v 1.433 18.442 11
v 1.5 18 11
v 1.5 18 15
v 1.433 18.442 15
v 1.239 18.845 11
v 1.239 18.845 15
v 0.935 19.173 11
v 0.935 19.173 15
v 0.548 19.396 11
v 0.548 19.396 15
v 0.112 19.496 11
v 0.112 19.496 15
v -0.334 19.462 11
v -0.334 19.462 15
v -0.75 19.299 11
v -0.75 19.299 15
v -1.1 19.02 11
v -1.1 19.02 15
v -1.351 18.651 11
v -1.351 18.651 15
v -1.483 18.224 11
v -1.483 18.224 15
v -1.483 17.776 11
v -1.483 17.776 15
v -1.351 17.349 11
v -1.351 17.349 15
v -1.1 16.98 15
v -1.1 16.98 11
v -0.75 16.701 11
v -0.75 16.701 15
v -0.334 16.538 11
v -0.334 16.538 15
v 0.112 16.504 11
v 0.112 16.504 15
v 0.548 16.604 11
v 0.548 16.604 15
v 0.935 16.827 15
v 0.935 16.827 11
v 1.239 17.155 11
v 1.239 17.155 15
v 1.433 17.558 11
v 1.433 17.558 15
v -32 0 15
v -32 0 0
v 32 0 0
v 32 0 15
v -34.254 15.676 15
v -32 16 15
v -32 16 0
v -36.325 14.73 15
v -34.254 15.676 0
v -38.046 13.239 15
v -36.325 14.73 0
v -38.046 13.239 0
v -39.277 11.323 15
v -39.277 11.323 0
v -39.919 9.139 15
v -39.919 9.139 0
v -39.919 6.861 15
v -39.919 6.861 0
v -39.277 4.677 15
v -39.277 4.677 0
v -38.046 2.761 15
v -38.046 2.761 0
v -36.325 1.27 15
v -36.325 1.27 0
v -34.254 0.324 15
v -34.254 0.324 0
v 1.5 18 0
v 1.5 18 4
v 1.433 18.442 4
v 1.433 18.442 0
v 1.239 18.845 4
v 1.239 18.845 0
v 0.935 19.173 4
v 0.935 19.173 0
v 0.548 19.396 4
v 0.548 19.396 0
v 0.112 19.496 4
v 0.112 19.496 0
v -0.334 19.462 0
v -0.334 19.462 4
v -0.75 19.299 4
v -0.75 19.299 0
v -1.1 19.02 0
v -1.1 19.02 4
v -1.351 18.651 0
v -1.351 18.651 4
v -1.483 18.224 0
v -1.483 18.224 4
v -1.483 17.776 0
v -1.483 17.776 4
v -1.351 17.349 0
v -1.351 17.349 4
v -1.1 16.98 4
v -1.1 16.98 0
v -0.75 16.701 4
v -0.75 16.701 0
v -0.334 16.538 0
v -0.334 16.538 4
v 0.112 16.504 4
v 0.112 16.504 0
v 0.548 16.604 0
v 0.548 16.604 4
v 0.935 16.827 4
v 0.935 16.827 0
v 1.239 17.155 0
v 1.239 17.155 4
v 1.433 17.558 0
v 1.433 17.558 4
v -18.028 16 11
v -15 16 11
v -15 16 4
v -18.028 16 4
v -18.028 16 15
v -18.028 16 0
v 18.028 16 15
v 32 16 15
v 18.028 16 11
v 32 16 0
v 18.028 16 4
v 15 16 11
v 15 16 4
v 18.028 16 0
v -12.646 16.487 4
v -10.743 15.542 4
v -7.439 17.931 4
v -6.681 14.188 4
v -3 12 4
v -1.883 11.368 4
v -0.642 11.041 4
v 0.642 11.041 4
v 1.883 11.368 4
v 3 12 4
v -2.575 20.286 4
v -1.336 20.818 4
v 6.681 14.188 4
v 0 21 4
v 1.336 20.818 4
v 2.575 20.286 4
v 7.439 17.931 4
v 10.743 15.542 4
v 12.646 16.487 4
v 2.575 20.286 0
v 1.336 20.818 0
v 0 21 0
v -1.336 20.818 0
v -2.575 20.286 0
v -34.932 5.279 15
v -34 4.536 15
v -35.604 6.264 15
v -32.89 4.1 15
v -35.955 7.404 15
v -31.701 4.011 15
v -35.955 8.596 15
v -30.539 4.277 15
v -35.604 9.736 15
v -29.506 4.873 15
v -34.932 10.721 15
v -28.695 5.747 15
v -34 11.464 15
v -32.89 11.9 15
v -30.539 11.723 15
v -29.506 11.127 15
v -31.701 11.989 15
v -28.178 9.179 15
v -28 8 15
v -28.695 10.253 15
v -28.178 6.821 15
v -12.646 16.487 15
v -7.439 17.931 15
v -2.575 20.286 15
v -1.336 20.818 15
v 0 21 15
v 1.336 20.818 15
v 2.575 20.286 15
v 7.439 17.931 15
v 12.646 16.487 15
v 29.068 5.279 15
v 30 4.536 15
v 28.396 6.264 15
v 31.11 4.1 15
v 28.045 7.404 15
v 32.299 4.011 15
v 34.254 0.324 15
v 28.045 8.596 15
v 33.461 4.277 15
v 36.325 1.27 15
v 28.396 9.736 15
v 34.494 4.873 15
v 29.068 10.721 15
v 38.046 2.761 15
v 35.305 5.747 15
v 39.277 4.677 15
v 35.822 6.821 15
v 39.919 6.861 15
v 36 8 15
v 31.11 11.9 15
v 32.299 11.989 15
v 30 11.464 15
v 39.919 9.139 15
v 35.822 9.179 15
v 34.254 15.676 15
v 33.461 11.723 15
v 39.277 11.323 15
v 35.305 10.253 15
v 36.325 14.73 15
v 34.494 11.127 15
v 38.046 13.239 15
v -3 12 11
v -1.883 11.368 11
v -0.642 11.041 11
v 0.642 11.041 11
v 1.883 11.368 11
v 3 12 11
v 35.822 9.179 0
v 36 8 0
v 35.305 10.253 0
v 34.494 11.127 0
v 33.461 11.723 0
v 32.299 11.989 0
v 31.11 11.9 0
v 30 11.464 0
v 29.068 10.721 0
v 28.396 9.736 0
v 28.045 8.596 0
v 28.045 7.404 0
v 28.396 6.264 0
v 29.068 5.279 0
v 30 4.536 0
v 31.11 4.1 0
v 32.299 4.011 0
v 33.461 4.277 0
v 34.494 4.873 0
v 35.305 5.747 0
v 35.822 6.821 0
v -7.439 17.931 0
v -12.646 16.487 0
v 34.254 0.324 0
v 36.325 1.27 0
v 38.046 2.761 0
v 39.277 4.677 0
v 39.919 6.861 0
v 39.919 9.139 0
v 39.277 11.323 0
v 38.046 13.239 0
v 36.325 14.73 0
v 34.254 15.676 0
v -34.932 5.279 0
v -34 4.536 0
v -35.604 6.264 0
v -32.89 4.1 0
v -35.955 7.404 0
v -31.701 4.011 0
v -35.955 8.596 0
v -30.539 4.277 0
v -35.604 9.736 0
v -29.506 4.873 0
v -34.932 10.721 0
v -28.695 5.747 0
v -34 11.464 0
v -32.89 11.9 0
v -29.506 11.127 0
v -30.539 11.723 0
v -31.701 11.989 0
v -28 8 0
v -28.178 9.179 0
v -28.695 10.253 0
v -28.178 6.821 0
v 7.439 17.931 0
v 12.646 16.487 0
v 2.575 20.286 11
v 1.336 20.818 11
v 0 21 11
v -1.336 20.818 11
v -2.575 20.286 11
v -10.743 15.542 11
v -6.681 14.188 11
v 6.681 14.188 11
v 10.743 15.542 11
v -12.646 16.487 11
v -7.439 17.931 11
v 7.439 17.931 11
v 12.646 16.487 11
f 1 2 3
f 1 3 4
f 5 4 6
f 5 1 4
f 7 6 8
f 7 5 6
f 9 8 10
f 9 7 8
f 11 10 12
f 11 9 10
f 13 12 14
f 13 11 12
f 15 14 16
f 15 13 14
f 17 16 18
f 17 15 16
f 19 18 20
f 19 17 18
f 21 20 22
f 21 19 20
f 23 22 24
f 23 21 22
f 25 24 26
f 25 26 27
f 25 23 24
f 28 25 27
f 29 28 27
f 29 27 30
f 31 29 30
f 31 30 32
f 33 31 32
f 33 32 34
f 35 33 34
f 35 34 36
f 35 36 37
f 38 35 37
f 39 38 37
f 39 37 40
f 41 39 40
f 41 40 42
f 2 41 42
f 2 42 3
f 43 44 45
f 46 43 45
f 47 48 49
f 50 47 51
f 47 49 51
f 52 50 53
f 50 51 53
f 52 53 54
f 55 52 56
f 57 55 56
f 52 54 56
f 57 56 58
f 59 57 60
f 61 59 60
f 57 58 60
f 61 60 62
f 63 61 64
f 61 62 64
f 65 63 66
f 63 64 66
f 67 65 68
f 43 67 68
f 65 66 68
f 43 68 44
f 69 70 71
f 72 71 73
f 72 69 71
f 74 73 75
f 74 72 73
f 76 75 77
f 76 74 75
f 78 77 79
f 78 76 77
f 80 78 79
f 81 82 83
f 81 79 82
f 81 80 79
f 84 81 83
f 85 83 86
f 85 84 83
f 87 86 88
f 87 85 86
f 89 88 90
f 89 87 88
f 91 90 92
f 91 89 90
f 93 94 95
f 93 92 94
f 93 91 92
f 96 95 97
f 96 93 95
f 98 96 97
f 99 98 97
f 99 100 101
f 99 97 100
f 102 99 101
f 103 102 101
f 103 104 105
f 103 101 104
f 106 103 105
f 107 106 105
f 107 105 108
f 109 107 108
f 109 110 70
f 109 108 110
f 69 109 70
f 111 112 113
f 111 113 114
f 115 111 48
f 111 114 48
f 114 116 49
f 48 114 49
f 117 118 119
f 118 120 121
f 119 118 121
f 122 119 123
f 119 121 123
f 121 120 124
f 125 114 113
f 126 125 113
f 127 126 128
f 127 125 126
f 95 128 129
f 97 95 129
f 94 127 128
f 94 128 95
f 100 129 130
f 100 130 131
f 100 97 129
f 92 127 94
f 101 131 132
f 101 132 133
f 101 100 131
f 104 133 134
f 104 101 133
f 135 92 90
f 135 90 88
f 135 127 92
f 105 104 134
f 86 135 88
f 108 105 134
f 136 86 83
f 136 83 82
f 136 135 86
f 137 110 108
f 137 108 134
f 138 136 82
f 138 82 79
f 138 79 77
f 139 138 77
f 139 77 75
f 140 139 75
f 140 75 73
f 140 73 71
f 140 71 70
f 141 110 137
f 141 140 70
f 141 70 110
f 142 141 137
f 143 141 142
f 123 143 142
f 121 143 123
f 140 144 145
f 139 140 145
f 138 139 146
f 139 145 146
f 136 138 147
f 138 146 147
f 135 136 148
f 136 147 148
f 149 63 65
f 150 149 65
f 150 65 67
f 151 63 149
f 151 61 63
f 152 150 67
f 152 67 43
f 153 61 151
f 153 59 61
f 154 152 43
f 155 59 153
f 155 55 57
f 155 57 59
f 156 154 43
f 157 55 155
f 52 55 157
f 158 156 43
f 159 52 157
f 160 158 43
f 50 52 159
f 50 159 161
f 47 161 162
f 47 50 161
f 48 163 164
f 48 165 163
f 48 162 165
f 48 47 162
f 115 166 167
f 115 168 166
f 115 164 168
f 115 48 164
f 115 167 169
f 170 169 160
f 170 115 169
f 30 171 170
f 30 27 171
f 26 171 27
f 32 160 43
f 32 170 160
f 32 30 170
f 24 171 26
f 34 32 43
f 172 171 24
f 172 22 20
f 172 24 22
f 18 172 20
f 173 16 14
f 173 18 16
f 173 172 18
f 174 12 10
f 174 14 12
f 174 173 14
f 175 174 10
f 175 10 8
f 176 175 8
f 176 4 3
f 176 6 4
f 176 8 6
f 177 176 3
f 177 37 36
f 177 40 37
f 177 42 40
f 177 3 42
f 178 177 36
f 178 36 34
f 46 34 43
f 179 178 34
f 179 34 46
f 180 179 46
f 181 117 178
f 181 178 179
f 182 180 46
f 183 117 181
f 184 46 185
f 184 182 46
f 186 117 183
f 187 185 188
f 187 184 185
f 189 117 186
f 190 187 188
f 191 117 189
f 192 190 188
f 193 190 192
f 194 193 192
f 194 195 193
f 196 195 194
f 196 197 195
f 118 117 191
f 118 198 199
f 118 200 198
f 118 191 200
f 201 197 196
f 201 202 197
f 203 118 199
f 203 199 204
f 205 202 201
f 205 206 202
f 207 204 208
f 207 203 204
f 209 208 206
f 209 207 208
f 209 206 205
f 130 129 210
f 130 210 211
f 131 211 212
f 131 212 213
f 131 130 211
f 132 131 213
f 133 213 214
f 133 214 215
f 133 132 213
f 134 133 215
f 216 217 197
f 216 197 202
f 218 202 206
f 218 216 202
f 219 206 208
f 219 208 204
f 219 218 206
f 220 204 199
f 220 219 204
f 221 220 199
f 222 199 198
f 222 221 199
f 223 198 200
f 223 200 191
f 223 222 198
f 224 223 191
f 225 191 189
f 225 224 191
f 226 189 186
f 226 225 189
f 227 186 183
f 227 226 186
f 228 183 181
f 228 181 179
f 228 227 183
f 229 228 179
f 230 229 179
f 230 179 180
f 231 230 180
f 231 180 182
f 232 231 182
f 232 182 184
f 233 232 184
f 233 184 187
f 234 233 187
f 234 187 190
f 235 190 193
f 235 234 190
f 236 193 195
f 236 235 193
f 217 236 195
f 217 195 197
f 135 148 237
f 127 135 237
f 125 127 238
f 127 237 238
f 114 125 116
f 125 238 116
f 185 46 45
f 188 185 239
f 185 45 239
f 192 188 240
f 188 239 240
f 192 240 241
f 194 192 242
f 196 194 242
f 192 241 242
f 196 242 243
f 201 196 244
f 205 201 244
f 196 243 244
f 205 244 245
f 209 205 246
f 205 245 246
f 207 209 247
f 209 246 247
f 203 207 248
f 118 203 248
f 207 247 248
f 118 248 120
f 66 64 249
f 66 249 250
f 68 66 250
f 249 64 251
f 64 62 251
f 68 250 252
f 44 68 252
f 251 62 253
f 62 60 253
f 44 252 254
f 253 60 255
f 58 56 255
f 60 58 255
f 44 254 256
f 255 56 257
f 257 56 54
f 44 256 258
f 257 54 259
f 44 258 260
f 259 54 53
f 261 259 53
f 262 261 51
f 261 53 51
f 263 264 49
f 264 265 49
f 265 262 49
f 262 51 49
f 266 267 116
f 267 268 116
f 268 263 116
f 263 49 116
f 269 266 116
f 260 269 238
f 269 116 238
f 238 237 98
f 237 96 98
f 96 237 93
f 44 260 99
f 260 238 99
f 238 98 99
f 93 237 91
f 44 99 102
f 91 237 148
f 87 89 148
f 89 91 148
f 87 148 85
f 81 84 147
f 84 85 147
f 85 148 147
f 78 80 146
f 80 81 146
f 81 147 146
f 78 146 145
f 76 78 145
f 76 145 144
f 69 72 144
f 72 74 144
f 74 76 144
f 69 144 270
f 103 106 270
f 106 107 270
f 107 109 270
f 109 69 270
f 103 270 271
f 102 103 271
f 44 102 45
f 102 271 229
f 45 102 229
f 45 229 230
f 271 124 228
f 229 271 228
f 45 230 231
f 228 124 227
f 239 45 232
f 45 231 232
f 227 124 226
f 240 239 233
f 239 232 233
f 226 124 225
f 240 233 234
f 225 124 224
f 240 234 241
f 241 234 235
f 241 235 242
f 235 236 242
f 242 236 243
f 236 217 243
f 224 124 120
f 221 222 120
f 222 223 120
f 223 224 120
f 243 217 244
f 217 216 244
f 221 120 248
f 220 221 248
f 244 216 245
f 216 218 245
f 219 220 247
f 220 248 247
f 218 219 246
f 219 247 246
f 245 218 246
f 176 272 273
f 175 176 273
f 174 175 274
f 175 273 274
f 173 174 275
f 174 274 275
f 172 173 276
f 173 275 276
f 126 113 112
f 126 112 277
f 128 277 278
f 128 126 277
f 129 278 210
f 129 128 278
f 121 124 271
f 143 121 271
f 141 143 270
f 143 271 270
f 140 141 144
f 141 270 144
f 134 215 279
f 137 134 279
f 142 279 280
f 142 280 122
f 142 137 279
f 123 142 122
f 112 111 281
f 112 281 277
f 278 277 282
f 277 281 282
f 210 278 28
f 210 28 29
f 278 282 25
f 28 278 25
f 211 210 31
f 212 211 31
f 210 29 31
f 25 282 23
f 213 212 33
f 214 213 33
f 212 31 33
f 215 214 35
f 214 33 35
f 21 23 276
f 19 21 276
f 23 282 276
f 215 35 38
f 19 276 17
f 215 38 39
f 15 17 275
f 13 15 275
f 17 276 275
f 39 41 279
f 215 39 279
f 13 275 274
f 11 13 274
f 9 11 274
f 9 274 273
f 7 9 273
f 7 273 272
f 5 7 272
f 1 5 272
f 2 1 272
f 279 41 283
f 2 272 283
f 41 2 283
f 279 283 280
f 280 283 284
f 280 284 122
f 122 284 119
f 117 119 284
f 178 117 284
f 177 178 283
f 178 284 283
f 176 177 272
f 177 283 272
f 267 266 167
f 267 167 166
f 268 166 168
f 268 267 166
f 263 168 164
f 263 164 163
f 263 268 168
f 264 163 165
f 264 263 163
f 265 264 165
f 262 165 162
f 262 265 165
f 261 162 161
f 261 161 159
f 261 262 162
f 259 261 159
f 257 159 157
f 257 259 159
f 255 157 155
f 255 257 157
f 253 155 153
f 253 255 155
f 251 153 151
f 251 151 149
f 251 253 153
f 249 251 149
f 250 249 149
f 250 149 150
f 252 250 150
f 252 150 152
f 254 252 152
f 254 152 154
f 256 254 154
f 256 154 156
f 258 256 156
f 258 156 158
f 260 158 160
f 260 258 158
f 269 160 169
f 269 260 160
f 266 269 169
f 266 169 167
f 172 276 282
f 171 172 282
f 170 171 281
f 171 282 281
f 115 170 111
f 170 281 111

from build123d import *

# Parameters (mm, degrees)
SKETCH1_R           = 1.5
SKETCH1_R_2         = 4
BOSS_EXTRUDE1_DEPTH = 15
CUT_EXTRUDE1_START  = -11
CUT_EXTRUDE1_DEPTH  = 7


with BuildPart() as part:
    # Sketch1 → Boss-Extrude1 (new body)
    with BuildSketch(Plane.XY):
        with BuildLine():
            Line((-32, 0), (32, 0))
            ThreePointArc((32, 0), (40, 8), (32, 16))
            Line((32, 16), (18.027756377, 16))
            ThreePointArc((18.027756377, 16), (10.00991912, 17.09127665), (2.575393768, 20.285714286))
            ThreePointArc((2.575393768, 20.285714286), (0, 21), (-2.575393768, 20.285714286))
            ThreePointArc((-2.575393768, 20.285714286), (-10.00991912, 17.09127665), (-18.027756377, 16))
            Line((-18.027756377, 16), (-32, 16))
            ThreePointArc((-32, 16), (-40, 8), (-32, 0))
        make_face()
        with Locations((0, 18)):
            Circle(SKETCH1_R, mode=Mode.SUBTRACT)
        with Locations((-32, 8)):
            Circle(SKETCH1_R_2, mode=Mode.SUBTRACT)
        with Locations((32, 8)):
            Circle(SKETCH1_R_2, mode=Mode.SUBTRACT)
    extrude(amount=BOSS_EXTRUDE1_DEPTH)

    # Sketch2 → Cut-Extrude1 (cut)
    with BuildSketch(Plane.XY.offset(15).offset(CUT_EXTRUDE1_START)):
        with BuildLine():
            Line((-18.027756377, 16), (-15, 16))
            ThreePointArc((-15, 16), (-8.67544468, 14.973665961), (-3, 12))
            ThreePointArc((-3, 12), (0, 11), (3, 12))
            ThreePointArc((3, 12), (8.67544468, 14.973665961), (15, 16))
            Line((15, 16), (18.027756377, 16))
            Line((18.027756377, 16), (18.027756377, 21))
            Line((18.027756377, 21), (-18.027756377, 21))
            Line((-18.027756377, 21), (-18.027756377, 16))
        make_face()
    extrude(amount=CUT_EXTRUDE1_DEPTH, mode=Mode.SUBTRACT)


solid = part.part
